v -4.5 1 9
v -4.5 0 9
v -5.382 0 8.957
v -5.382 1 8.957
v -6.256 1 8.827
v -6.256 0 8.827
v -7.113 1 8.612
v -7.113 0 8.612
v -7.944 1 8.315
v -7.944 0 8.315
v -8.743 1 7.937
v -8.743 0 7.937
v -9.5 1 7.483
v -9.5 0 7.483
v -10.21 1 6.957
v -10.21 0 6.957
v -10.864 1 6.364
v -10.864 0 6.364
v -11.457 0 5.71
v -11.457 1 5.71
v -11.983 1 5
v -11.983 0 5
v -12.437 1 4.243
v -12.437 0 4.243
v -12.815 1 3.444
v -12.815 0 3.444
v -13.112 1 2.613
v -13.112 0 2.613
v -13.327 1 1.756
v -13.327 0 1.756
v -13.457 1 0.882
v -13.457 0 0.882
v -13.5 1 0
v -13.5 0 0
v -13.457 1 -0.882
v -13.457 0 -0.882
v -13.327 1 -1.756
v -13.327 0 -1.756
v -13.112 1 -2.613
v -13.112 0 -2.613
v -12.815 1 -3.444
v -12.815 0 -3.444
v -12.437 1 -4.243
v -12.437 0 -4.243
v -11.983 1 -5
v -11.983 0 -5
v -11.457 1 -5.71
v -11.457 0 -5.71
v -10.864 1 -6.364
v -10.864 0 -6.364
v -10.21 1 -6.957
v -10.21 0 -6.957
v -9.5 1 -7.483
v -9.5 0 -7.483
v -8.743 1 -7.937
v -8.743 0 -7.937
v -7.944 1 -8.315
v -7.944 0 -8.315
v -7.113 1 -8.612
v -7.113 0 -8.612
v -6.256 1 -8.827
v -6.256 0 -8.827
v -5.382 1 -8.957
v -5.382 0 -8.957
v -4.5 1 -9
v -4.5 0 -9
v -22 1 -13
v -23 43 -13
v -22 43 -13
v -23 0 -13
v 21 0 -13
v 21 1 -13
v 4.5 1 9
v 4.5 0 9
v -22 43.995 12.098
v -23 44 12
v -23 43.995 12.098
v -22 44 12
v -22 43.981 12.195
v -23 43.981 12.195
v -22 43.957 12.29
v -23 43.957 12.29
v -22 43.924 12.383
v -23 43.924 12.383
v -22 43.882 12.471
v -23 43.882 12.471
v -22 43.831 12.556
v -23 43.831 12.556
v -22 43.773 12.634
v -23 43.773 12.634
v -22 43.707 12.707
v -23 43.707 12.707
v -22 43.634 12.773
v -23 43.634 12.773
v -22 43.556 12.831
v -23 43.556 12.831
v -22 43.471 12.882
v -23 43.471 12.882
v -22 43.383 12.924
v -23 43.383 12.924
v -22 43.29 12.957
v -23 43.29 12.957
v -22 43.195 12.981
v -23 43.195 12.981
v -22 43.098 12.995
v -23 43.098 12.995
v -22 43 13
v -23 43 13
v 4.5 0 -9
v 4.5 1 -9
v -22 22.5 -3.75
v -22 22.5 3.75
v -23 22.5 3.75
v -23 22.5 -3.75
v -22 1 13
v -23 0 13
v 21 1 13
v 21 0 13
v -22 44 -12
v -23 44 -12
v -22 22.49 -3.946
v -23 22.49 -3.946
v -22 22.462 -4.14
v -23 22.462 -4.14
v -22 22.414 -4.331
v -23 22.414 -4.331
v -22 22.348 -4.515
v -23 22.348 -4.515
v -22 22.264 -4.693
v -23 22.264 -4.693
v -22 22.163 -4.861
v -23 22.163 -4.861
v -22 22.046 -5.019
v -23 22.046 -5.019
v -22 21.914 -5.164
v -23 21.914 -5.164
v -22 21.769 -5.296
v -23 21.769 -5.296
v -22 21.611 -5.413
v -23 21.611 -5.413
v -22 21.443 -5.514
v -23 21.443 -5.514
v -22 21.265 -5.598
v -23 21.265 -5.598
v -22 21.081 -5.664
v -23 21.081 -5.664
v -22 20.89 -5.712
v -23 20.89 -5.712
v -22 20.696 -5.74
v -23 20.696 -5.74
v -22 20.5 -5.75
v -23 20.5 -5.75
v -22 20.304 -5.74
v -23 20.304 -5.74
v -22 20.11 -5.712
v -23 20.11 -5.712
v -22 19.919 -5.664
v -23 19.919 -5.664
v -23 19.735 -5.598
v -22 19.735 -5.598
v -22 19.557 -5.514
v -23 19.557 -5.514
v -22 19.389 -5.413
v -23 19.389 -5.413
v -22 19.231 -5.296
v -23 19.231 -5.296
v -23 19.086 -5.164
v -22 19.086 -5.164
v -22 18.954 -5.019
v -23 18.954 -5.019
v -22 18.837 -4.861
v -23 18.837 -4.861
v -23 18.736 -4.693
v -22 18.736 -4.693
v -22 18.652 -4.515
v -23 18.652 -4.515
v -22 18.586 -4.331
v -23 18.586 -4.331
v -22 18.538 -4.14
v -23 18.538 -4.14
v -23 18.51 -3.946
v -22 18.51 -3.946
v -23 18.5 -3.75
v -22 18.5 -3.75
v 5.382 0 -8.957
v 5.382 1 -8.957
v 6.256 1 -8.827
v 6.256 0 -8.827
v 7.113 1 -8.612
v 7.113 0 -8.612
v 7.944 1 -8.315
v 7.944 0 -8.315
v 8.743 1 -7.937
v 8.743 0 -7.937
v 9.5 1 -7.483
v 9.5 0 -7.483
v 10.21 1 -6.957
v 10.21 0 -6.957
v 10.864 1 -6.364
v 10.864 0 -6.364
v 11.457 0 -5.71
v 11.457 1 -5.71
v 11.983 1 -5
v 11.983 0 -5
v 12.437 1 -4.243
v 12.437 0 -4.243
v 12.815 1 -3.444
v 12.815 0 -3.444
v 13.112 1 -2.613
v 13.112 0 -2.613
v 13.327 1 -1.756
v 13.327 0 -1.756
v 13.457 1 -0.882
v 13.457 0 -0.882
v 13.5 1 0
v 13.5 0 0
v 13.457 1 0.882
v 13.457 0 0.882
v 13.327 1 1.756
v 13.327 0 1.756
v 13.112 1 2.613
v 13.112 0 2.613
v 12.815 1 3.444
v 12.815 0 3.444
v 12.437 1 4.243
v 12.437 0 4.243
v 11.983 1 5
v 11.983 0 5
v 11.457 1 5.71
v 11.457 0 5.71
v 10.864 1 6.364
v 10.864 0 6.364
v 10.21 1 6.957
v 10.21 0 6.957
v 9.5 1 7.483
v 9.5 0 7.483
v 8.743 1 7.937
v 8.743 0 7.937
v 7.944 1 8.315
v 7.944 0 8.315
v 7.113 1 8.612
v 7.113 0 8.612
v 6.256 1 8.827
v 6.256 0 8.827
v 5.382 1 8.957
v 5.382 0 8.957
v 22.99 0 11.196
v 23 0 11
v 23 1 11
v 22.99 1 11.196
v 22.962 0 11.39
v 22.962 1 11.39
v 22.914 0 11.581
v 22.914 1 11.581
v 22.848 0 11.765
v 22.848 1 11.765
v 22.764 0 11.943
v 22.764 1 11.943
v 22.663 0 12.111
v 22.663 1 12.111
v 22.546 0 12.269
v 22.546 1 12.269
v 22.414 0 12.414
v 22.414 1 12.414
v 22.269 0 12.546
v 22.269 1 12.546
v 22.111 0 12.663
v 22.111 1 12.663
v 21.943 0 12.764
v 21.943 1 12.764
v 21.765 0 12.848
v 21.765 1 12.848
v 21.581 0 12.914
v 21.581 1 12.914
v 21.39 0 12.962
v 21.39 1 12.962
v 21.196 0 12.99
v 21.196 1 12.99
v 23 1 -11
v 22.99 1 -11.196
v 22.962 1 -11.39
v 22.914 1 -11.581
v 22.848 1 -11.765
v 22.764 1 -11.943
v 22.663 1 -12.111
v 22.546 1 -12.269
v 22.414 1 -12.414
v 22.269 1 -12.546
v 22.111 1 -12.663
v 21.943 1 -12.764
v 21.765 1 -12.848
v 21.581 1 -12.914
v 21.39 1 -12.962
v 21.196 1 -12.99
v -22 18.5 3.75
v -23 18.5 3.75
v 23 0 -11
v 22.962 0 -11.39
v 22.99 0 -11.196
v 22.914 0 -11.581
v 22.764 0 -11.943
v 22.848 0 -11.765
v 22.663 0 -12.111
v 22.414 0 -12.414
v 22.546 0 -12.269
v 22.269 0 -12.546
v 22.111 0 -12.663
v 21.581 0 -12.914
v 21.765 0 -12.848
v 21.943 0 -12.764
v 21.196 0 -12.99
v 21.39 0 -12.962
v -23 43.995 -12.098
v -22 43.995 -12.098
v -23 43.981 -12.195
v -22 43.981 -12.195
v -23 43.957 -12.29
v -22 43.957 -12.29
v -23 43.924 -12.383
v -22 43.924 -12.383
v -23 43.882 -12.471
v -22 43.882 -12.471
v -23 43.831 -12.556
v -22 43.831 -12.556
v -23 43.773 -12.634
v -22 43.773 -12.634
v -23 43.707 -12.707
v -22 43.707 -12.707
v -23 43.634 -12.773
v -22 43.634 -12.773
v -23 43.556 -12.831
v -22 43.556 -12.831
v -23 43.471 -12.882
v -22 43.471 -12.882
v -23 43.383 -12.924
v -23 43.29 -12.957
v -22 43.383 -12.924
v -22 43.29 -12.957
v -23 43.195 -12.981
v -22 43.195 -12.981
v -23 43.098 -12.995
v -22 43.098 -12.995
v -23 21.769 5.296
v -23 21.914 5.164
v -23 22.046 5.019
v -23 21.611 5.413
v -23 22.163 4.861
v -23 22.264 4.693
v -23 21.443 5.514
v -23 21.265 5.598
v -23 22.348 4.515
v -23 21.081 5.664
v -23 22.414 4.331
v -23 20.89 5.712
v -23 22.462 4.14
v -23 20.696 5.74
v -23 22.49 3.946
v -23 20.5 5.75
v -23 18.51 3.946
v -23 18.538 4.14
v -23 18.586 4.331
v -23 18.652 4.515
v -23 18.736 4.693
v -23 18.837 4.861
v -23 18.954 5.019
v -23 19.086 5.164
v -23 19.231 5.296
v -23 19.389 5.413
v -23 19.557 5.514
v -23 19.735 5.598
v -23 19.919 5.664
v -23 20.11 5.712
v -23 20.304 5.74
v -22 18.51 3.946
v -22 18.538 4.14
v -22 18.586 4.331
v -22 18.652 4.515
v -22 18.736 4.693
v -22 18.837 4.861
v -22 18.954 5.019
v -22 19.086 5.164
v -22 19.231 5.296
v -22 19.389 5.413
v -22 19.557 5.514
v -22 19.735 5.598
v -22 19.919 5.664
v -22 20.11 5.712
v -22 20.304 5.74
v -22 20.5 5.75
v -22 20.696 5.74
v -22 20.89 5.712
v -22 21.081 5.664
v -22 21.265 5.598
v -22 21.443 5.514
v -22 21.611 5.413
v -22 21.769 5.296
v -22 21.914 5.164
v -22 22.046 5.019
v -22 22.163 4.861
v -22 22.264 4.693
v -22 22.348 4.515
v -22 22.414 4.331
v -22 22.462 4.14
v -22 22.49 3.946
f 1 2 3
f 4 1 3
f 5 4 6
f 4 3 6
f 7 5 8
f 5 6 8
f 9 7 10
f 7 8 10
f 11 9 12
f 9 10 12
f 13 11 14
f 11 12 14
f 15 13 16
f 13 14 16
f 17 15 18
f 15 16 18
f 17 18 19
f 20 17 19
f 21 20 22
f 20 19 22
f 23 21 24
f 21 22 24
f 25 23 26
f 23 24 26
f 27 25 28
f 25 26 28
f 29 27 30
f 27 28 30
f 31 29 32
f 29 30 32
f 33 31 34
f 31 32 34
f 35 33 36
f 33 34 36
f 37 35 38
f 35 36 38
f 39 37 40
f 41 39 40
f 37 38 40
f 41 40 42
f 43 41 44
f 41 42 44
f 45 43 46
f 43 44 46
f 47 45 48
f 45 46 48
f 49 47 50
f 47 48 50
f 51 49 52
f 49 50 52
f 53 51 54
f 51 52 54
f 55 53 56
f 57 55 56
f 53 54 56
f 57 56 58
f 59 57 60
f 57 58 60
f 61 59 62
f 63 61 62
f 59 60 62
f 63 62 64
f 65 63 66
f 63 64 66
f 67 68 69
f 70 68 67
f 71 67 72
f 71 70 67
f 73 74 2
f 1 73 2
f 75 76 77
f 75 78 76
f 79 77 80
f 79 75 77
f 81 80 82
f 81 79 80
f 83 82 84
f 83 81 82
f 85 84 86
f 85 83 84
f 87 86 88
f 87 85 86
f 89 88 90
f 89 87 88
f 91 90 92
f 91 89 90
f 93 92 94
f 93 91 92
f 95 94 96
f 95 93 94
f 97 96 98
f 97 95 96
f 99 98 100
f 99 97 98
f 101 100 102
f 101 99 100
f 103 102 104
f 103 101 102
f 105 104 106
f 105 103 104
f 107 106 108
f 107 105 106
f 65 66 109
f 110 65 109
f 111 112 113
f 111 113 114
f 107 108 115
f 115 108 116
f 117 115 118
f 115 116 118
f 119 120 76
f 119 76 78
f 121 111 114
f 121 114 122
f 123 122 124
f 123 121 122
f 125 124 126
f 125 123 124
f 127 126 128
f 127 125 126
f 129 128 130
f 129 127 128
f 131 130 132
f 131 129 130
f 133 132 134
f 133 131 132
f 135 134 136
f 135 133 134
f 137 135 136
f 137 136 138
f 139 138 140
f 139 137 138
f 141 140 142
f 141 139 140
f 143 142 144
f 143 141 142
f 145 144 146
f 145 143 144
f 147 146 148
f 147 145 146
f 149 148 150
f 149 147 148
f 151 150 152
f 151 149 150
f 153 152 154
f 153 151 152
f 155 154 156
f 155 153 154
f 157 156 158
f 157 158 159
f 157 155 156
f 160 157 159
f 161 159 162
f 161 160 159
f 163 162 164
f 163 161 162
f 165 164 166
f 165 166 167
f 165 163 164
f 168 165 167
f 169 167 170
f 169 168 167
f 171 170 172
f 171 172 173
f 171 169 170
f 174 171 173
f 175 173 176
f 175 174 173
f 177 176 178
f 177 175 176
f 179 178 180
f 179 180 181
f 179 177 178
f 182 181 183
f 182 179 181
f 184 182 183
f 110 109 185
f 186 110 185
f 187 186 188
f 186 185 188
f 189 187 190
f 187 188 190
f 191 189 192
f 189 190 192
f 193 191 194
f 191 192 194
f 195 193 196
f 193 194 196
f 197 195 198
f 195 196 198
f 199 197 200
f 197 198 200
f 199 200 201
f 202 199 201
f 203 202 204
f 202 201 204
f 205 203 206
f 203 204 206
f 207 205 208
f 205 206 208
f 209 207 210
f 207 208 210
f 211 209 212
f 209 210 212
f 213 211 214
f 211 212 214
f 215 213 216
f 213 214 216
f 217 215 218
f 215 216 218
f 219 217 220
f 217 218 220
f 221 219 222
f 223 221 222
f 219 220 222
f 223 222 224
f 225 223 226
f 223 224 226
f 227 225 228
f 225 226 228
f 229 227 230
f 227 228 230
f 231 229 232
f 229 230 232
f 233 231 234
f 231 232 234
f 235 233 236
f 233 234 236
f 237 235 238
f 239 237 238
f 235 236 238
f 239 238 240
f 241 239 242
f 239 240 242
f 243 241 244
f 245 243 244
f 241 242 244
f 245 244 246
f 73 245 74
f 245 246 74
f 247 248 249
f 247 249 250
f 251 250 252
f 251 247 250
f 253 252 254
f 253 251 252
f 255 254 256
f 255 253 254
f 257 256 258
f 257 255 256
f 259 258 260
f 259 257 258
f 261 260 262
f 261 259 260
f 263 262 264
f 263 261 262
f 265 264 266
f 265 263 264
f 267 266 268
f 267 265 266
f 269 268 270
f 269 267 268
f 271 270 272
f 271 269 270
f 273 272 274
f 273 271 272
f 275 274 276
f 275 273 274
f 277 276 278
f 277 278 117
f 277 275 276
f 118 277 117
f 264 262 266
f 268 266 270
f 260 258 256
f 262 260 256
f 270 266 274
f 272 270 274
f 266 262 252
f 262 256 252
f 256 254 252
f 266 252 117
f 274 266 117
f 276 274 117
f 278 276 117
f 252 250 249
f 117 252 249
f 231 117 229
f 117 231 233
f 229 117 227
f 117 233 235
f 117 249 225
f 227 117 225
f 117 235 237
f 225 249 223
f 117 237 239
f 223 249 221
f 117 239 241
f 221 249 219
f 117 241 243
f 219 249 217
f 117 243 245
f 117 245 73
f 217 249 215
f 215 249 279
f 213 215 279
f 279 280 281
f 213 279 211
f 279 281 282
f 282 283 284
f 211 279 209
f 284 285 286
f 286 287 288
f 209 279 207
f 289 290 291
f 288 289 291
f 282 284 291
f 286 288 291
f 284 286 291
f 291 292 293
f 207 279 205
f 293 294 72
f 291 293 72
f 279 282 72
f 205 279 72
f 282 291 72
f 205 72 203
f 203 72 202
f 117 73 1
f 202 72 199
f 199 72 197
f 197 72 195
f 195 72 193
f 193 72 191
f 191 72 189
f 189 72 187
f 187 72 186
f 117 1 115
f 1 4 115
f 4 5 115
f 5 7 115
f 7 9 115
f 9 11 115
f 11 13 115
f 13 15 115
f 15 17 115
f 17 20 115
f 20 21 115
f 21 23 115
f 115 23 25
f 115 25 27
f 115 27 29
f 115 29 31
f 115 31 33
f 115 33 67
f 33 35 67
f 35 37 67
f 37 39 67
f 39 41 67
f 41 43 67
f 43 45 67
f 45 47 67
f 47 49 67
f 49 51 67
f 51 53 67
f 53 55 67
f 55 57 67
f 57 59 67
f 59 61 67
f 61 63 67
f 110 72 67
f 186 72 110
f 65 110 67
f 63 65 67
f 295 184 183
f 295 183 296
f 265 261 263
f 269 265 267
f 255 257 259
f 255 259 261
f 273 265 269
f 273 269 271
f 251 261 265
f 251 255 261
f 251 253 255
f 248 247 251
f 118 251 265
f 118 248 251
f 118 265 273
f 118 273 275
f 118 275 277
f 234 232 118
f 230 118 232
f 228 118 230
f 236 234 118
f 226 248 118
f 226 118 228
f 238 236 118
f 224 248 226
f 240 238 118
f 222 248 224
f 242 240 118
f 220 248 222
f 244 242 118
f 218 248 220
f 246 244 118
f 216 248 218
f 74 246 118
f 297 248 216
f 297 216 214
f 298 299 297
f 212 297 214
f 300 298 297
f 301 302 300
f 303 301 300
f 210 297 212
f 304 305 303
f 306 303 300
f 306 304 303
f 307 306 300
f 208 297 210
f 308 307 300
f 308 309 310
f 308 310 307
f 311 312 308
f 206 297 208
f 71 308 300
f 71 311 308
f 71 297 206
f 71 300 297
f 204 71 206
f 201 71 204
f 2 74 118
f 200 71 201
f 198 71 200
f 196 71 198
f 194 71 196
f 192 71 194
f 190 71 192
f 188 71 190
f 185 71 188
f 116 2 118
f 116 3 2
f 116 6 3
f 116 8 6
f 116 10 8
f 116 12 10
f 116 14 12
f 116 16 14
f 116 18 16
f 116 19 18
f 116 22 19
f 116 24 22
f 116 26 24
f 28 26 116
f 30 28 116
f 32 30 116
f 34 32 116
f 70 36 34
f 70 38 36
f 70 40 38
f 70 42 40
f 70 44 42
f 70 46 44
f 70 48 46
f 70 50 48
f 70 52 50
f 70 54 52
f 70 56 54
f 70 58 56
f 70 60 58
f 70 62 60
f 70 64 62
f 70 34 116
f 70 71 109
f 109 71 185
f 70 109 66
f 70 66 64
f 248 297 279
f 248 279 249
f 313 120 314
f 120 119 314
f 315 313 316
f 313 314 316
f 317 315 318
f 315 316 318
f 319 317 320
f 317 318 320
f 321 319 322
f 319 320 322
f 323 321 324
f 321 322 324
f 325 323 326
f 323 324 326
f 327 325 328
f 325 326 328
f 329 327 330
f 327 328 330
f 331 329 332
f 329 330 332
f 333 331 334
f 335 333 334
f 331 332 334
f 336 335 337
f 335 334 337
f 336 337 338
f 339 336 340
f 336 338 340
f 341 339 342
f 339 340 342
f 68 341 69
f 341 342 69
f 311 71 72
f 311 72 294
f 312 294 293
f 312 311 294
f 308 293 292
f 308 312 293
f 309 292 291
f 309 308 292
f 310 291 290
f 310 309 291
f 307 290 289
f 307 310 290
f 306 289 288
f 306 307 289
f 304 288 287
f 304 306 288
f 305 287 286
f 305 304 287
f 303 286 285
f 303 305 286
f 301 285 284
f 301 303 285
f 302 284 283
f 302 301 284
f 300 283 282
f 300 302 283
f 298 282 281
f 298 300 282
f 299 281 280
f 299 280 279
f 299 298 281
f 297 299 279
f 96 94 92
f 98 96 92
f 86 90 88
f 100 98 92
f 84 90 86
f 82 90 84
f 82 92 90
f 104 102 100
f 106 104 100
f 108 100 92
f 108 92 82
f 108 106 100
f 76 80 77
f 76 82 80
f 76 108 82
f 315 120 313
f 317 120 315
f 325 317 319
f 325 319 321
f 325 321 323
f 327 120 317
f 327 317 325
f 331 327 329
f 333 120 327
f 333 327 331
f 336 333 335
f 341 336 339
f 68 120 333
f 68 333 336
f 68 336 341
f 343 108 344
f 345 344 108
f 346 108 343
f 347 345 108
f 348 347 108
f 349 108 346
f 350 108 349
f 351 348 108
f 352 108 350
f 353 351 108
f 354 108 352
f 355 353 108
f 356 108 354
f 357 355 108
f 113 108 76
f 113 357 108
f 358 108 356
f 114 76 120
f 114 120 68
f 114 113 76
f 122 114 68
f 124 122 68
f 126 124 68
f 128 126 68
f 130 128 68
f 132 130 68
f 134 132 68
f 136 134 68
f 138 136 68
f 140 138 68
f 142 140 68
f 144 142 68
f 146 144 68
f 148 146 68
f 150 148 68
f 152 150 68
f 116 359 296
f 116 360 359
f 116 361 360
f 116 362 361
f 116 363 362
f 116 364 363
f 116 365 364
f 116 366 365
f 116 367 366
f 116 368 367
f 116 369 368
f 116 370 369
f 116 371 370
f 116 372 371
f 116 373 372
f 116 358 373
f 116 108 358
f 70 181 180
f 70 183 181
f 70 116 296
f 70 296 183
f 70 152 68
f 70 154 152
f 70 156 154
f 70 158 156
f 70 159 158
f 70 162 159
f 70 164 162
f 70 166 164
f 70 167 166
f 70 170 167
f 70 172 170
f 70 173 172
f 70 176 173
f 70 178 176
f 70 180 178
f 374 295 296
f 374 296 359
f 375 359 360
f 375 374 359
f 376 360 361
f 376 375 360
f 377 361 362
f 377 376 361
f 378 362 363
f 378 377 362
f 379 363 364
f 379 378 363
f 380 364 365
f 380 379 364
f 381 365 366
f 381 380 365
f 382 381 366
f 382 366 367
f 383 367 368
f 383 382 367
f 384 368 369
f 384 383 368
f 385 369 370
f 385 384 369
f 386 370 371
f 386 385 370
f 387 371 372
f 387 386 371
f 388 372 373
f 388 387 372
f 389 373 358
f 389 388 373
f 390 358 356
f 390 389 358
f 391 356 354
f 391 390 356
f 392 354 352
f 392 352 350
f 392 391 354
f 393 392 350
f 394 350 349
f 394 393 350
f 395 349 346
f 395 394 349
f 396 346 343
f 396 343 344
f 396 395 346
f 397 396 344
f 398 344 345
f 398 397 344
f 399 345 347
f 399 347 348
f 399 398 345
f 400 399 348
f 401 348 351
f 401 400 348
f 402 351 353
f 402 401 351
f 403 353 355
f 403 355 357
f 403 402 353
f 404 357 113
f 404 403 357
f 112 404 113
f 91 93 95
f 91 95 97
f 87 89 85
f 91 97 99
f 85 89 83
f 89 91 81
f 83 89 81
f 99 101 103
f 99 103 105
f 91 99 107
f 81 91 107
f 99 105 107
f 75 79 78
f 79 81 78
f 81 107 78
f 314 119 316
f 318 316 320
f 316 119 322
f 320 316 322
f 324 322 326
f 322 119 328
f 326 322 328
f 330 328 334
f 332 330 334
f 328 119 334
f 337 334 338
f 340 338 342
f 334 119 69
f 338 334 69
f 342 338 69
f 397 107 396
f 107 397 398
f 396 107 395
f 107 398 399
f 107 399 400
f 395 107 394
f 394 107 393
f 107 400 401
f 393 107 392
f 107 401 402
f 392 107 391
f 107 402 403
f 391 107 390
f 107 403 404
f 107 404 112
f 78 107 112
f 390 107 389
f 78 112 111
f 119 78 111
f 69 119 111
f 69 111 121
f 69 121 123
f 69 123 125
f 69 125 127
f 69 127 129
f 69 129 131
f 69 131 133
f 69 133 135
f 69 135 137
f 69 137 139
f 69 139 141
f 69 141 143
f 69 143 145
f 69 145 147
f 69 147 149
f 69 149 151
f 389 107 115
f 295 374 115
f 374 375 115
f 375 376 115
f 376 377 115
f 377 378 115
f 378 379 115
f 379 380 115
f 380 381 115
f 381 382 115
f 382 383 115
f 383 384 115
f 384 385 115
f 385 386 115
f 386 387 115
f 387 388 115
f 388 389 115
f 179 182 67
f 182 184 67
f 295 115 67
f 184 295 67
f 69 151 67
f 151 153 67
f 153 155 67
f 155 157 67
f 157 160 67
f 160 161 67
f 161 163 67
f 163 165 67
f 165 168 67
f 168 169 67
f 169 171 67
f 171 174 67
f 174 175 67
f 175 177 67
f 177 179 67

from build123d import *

# Parameters (mm, degrees)
BOSS_EXTRUDE1_DEPTH = 1
SKETCH2_W           = 1
SKETCH2_H           = 26
BOSS_EXTRUDE2_DEPTH = 43
CUT_EXTRUDE1_DEPTH  = 1
FILLET1_R           = 1


with BuildPart() as part:
    # Sketch1 → Boss-Extrude1 (new body)
    with BuildSketch(Plane(origin=(0, 0, 0), x_dir=(1, 0, 0), z_dir=(0, 1, 0))):
        with BuildLine():
            Line((-23, 13), (21, 13))
            ThreePointArc((21, 13), (22.414213562, 12.414213562), (23, 11))
            Line((23, 11), (23, -11))
            ThreePointArc((23, -11), (22.414213562, -12.414213562), (21, -13))
            Line((21, -13), (-23, -13))
            Line((-23, -13), (-23, 13))
        make_face()
        with BuildLine():
            Line((-4.5, 9), (4.5, 9))
            ThreePointArc((4.5, 9), (13.5, 0), (4.5, -9))
            Line((4.5, -9), (-4.5, -9))
            ThreePointArc((-4.5, -9), (-13.5, 0), (-4.5, 9))
        make_face(mode=Mode.SUBTRACT)
    extrude(amount=BOSS_EXTRUDE1_DEPTH)

    # Sketch2 → Boss-Extrude2 (add)
    with BuildSketch(Plane(origin=(0, 1, 0), x_dir=(1, 0, 0), z_dir=(0, 1, 0))):
        with Locations((-22.5, 0)):
            Rectangle(SKETCH2_W, SKETCH2_H)
    extrude(amount=BOSS_EXTRUDE2_DEPTH)

    # Sketch3 → Cut-Extrude1 (cut)
    with BuildSketch(Plane(origin=(-22, 0, 0), x_dir=(0, 0, -1), z_dir=(1, 0, 0))):
        with BuildLine():
            Line((-3.75, 22.5), (3.75, 22.5))
            ThreePointArc((3.75, 22.5), (5.75, 20.5), (3.75, 18.5))
            Line((3.75, 18.5), (-3.75, 18.5))
            ThreePointArc((-3.75, 18.5), (-5.75, 20.5), (-3.75, 22.5))
        make_face()
    extrude(amount=-CUT_EXTRUDE1_DEPTH, mode=Mode.SUBTRACT)

    # Fillet1
    fillet1_edges = [part.edges().sort_by_distance(p)[0] for p in [
        (-22.5, 44, -13),
        (-22.5, 44, 13),
    ]]
    fillet(fillet1_edges, radius=FILLET1_R)


solid = part.part
